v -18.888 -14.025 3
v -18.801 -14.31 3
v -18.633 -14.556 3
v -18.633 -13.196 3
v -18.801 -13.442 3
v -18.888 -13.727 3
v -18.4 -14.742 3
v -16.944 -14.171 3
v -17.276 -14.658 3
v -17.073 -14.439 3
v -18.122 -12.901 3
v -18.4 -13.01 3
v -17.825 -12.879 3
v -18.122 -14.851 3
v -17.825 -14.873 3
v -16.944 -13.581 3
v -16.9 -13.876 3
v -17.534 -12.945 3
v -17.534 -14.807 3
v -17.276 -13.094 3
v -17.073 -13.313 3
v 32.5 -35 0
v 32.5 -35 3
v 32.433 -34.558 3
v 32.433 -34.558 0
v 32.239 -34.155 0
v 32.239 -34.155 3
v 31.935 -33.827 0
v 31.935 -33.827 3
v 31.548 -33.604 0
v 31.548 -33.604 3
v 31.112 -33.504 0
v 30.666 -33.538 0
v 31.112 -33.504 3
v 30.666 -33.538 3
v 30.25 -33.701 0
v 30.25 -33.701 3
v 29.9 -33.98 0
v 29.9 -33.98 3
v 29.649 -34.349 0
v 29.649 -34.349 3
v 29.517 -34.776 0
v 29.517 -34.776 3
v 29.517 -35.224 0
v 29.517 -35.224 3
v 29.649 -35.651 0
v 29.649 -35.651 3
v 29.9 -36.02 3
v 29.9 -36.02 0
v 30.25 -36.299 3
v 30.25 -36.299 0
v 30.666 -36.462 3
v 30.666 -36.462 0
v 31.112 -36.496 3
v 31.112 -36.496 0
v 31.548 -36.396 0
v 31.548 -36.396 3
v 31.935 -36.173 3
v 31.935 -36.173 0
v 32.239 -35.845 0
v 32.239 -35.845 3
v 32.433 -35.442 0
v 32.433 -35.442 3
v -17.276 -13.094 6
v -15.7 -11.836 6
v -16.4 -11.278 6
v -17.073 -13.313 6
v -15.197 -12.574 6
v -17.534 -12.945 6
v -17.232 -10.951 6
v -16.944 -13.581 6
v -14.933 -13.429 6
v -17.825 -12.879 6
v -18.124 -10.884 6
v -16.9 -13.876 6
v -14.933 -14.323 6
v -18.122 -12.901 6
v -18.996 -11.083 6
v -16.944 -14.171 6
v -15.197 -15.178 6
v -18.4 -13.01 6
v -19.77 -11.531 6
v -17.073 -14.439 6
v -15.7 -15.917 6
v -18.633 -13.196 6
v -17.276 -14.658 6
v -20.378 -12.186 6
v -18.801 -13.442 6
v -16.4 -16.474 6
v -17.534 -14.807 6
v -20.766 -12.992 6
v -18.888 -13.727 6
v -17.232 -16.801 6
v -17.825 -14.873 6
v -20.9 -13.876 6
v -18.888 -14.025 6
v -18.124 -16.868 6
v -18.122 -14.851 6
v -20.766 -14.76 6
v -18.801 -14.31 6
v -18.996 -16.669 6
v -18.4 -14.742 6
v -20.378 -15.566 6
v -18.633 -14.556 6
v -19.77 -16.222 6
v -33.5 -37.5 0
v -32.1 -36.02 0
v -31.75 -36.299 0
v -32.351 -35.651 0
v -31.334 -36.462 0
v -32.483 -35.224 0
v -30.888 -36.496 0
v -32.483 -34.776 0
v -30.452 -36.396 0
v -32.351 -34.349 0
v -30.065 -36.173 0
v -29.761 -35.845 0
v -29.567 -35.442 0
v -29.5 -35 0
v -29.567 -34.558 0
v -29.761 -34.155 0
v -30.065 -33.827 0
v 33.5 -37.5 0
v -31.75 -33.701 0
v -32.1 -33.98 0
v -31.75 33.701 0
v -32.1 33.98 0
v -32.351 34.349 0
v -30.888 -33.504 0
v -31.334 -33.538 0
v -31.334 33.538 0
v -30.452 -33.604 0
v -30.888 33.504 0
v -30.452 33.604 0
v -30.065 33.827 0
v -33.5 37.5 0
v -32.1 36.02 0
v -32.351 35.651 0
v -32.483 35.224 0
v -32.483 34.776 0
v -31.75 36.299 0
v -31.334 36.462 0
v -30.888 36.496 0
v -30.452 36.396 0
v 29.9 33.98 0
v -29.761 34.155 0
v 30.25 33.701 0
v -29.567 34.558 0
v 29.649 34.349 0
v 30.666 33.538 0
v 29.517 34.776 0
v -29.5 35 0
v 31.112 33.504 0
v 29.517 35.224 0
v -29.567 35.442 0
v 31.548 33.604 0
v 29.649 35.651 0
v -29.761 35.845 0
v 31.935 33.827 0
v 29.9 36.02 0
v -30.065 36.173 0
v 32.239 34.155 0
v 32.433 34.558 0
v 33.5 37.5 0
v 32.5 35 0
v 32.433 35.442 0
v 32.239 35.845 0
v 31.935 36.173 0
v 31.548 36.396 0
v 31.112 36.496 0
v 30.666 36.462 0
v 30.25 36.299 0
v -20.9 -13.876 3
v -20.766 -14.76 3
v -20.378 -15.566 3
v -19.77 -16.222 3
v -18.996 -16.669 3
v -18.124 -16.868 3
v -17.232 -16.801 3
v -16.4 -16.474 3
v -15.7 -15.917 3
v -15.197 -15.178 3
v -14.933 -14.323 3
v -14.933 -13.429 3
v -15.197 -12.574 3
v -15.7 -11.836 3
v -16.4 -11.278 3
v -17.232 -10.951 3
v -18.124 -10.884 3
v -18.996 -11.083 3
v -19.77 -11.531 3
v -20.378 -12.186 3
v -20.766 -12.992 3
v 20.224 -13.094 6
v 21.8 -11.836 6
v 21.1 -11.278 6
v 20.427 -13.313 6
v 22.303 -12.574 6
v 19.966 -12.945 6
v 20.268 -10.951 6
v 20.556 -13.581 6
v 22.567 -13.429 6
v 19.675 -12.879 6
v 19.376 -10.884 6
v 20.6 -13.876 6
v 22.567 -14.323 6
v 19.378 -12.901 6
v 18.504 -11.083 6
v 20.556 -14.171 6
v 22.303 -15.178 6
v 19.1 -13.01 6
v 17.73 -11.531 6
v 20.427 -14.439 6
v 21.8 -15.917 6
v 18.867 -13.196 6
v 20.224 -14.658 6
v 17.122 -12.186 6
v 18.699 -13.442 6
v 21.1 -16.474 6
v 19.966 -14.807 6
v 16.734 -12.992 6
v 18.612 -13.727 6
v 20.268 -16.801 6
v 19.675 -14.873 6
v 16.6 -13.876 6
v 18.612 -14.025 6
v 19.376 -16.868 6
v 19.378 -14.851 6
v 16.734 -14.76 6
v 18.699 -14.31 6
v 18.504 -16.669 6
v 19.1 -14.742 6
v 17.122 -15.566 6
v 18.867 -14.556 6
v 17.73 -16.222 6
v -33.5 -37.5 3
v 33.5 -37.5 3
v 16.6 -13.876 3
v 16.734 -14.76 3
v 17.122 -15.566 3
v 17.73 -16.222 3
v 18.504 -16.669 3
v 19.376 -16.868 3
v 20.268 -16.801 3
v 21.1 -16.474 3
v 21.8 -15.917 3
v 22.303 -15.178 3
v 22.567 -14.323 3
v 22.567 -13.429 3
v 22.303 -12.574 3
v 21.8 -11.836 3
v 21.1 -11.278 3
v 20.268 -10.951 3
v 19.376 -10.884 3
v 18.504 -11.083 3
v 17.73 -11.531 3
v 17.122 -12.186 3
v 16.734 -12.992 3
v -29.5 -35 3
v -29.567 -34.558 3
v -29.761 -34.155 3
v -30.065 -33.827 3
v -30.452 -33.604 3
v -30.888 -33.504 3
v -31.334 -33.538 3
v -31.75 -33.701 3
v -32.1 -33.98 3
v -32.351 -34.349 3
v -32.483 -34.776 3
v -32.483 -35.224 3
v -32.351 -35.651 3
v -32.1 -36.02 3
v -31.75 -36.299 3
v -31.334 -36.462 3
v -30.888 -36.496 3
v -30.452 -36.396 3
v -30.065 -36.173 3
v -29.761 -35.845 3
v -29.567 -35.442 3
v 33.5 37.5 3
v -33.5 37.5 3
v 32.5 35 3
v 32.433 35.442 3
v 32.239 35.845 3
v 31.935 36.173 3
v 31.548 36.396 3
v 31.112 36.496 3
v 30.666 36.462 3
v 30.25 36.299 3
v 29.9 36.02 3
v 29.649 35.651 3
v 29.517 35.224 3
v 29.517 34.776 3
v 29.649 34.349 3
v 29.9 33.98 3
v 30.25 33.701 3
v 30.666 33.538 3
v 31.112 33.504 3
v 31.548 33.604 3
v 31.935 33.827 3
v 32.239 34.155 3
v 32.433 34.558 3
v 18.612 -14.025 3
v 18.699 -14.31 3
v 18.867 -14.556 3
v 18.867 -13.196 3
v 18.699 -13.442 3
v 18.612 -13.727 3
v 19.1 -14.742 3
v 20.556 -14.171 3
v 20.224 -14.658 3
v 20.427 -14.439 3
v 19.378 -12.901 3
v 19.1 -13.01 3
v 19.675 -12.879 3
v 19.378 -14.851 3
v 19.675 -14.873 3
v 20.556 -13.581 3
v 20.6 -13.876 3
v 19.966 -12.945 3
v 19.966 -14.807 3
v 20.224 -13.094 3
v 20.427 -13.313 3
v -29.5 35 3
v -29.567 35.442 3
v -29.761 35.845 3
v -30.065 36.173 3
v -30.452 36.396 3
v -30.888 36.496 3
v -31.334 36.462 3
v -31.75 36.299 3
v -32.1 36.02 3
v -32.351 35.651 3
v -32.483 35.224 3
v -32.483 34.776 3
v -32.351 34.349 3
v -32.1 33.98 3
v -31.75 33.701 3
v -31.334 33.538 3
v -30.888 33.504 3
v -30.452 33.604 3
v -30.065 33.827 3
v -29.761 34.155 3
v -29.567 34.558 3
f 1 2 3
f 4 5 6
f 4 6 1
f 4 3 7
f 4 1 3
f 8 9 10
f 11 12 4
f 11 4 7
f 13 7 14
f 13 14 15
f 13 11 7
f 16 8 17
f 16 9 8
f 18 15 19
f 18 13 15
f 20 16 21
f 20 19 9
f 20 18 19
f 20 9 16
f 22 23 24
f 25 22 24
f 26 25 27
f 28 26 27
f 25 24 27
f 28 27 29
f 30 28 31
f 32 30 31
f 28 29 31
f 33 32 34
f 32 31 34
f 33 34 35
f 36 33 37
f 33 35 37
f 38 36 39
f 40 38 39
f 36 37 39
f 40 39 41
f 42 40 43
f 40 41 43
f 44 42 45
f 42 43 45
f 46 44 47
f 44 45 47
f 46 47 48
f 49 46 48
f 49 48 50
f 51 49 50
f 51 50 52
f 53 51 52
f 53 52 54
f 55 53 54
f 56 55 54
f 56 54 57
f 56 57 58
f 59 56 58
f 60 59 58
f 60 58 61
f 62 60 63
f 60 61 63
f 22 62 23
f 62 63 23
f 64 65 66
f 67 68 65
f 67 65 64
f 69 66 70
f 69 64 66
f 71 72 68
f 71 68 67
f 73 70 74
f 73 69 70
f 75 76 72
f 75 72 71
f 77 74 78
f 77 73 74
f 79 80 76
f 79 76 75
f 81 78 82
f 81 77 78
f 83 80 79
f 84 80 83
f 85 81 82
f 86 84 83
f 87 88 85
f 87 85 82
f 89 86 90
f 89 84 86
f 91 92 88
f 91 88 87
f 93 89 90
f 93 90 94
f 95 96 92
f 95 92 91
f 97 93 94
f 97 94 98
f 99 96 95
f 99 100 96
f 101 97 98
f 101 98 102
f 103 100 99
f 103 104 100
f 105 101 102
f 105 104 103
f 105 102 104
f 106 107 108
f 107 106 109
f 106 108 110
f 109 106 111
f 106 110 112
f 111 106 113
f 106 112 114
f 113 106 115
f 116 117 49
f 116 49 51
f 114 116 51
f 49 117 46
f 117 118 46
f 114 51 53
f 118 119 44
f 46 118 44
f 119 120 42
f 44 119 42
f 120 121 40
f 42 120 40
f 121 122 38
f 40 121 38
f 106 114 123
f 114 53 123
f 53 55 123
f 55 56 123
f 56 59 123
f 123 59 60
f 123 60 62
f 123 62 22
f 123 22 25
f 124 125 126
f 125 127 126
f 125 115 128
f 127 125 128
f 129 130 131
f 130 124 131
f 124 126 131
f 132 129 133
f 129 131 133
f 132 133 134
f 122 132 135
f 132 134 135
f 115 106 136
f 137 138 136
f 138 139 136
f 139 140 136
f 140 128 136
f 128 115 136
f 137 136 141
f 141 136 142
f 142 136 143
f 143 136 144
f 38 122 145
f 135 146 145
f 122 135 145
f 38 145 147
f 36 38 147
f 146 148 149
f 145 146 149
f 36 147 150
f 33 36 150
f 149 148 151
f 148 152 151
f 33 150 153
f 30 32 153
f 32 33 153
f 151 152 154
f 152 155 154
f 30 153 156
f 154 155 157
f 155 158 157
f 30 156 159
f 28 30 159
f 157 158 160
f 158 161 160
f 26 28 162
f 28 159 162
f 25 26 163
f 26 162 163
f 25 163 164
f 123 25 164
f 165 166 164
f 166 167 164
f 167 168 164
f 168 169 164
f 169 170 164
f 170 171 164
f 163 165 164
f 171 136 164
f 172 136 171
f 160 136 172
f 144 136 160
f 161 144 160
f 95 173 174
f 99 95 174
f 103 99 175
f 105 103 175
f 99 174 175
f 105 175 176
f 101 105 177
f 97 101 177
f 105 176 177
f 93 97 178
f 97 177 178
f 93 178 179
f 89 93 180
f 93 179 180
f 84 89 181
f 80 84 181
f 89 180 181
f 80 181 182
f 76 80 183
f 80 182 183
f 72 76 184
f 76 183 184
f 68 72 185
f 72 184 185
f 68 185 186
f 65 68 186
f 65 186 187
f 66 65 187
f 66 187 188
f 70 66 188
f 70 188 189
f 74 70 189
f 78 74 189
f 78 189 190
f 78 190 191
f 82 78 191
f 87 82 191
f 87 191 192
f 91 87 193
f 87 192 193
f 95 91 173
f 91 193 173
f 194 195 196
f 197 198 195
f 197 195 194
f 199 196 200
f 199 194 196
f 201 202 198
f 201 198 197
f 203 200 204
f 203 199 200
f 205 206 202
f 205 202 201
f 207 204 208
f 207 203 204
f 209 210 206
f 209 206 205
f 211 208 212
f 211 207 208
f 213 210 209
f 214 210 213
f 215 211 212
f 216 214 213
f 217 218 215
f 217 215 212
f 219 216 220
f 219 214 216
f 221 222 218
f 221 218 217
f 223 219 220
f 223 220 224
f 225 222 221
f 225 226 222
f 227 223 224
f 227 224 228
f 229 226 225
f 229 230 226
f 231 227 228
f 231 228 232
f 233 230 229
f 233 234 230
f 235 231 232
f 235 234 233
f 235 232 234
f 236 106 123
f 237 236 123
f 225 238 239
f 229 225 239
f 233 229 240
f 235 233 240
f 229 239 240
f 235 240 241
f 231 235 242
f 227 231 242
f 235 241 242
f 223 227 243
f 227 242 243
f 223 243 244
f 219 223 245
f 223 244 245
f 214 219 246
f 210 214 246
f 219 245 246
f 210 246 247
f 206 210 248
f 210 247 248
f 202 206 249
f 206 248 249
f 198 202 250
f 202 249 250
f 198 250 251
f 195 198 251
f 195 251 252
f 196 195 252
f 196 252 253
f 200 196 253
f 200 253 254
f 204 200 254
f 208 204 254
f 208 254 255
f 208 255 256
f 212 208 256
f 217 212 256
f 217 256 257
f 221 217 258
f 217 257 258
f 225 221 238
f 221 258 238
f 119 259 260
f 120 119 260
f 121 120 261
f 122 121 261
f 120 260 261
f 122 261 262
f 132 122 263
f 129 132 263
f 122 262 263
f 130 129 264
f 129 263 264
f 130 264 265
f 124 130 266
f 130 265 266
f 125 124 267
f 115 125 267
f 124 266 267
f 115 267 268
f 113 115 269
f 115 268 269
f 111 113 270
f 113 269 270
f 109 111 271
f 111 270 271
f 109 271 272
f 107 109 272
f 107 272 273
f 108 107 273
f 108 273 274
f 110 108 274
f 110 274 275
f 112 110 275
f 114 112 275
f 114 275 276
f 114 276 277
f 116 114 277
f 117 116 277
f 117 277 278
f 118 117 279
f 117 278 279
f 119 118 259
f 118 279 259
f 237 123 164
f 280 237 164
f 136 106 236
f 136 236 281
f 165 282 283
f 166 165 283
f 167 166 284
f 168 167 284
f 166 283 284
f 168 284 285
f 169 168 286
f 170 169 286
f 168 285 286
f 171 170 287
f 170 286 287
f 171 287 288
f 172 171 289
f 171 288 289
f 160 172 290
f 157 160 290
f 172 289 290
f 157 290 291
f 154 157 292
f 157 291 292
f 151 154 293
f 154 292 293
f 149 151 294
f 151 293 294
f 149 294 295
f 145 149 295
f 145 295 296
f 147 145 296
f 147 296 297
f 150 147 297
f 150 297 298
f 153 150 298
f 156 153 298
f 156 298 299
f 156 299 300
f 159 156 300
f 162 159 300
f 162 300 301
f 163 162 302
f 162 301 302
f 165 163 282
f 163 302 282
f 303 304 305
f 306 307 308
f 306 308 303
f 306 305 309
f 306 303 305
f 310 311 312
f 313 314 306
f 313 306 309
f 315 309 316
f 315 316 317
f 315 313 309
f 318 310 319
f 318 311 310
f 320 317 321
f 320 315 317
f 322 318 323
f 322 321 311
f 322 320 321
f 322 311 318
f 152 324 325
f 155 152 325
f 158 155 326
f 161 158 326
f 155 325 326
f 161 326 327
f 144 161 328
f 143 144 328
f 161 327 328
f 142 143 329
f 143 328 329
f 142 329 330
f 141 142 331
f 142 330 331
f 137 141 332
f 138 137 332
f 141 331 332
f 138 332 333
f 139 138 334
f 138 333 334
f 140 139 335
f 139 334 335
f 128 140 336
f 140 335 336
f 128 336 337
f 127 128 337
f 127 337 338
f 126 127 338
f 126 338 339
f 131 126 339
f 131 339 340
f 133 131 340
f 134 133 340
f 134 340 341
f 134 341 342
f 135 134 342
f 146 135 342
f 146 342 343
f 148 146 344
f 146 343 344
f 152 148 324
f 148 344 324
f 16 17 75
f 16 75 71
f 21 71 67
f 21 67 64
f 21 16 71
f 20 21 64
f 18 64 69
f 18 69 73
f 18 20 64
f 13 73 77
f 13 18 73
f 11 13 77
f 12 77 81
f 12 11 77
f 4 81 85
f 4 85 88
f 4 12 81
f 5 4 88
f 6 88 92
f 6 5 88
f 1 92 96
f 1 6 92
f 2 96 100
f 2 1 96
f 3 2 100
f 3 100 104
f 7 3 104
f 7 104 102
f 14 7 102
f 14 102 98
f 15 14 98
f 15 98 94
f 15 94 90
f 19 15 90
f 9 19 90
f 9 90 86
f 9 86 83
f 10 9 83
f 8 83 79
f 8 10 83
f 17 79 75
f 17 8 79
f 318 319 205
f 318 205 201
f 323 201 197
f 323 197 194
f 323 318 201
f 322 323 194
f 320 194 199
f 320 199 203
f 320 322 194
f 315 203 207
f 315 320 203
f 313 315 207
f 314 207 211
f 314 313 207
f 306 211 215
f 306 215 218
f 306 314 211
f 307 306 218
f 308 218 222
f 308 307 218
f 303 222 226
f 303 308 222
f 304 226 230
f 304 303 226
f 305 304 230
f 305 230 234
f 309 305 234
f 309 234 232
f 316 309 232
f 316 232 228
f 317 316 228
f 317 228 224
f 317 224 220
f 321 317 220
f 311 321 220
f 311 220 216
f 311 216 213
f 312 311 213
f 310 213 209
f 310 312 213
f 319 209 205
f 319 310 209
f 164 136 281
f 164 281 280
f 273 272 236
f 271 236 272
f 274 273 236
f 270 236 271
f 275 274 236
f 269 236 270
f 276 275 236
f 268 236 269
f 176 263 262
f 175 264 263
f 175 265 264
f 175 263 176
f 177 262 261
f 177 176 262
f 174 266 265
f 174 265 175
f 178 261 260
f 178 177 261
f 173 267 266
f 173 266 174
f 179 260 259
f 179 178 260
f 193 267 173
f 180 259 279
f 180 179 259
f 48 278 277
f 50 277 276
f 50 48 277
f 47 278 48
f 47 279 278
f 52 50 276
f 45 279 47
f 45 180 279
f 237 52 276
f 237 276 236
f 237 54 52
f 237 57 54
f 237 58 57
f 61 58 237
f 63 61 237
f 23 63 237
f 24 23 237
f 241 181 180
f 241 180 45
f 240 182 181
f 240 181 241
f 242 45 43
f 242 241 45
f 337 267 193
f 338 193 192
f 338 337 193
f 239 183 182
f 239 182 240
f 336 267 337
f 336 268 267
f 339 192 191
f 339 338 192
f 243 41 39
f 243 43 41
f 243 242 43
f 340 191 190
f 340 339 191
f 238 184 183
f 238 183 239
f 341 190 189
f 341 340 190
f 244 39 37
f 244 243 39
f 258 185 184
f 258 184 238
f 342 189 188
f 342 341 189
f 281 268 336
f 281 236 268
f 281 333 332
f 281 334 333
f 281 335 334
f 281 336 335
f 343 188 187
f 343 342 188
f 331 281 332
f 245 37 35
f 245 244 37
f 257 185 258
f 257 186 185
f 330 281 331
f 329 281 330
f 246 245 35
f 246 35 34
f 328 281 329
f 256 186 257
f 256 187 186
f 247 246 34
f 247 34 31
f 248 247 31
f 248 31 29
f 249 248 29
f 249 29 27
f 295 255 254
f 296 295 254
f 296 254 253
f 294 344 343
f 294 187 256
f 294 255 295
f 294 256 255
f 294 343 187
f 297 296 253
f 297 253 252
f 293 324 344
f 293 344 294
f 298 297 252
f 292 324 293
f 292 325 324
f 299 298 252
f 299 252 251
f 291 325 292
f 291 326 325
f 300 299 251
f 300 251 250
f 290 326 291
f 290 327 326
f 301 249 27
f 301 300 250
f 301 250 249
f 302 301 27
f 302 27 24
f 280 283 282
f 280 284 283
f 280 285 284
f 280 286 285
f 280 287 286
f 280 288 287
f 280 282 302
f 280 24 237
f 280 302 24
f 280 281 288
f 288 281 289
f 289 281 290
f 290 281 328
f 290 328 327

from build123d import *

# Parameters (mm, degrees)
SKETCH1_W           = 67
SKETCH1_H           = 75
BOSS_EXTRUDE1_DEPTH = 3
SKETCH2_R           = 1.5
CUT_EXTRUDE1_DEPTH  = 3
SKETCH3_R           = 3
SKETCH3_R_2         = 1
BOSS_EXTRUDE2_DEPTH = 3


with BuildPart() as part:
    # Sketch1 → Boss-Extrude1 (new body)
    with BuildSketch(Plane.XY):
        Rectangle(SKETCH1_W, SKETCH1_H)
    extrude(amount=BOSS_EXTRUDE1_DEPTH)

    # Sketch2 → Cut-Extrude1 (cut)
    with BuildSketch(Plane.XY.offset(3)):
        with Locations((-31, 35)):
            Circle(SKETCH2_R)
        with Locations((31, 35)):
            Circle(SKETCH2_R)
        with Locations((31, -35)):
            Circle(SKETCH2_R)
        with Locations((-31, -35)):
            Circle(SKETCH2_R)
    extrude(amount=-CUT_EXTRUDE1_DEPTH, mode=Mode.SUBTRACT)

    # Sketch3 → Boss-Extrude2 (add)
    # profile 1 of 2: a face of its own
    with BuildSketch(Plane.XY.offset(3)):
        with Locations(Location((-17.899535592, -13.876081532, 0), (0, 0, 180))):
            Circle(SKETCH3_R)
        with Locations((-17.899535592, -13.876081532)):
            Circle(SKETCH3_R_2, mode=Mode.SUBTRACT)
    # profile 2 of 2: a face of its own
    with BuildSketch(Plane.XY.offset(3)):
        with Locations(Location((19.600464408, -13.876081532, 0), (0, 0, 180))):
            Circle(SKETCH3_R)
        with Locations((19.600464408, -13.876081532)):
            Circle(SKETCH3_R_2, mode=Mode.SUBTRACT)
    extrude(amount=BOSS_EXTRUDE2_DEPTH)


solid = part.part
